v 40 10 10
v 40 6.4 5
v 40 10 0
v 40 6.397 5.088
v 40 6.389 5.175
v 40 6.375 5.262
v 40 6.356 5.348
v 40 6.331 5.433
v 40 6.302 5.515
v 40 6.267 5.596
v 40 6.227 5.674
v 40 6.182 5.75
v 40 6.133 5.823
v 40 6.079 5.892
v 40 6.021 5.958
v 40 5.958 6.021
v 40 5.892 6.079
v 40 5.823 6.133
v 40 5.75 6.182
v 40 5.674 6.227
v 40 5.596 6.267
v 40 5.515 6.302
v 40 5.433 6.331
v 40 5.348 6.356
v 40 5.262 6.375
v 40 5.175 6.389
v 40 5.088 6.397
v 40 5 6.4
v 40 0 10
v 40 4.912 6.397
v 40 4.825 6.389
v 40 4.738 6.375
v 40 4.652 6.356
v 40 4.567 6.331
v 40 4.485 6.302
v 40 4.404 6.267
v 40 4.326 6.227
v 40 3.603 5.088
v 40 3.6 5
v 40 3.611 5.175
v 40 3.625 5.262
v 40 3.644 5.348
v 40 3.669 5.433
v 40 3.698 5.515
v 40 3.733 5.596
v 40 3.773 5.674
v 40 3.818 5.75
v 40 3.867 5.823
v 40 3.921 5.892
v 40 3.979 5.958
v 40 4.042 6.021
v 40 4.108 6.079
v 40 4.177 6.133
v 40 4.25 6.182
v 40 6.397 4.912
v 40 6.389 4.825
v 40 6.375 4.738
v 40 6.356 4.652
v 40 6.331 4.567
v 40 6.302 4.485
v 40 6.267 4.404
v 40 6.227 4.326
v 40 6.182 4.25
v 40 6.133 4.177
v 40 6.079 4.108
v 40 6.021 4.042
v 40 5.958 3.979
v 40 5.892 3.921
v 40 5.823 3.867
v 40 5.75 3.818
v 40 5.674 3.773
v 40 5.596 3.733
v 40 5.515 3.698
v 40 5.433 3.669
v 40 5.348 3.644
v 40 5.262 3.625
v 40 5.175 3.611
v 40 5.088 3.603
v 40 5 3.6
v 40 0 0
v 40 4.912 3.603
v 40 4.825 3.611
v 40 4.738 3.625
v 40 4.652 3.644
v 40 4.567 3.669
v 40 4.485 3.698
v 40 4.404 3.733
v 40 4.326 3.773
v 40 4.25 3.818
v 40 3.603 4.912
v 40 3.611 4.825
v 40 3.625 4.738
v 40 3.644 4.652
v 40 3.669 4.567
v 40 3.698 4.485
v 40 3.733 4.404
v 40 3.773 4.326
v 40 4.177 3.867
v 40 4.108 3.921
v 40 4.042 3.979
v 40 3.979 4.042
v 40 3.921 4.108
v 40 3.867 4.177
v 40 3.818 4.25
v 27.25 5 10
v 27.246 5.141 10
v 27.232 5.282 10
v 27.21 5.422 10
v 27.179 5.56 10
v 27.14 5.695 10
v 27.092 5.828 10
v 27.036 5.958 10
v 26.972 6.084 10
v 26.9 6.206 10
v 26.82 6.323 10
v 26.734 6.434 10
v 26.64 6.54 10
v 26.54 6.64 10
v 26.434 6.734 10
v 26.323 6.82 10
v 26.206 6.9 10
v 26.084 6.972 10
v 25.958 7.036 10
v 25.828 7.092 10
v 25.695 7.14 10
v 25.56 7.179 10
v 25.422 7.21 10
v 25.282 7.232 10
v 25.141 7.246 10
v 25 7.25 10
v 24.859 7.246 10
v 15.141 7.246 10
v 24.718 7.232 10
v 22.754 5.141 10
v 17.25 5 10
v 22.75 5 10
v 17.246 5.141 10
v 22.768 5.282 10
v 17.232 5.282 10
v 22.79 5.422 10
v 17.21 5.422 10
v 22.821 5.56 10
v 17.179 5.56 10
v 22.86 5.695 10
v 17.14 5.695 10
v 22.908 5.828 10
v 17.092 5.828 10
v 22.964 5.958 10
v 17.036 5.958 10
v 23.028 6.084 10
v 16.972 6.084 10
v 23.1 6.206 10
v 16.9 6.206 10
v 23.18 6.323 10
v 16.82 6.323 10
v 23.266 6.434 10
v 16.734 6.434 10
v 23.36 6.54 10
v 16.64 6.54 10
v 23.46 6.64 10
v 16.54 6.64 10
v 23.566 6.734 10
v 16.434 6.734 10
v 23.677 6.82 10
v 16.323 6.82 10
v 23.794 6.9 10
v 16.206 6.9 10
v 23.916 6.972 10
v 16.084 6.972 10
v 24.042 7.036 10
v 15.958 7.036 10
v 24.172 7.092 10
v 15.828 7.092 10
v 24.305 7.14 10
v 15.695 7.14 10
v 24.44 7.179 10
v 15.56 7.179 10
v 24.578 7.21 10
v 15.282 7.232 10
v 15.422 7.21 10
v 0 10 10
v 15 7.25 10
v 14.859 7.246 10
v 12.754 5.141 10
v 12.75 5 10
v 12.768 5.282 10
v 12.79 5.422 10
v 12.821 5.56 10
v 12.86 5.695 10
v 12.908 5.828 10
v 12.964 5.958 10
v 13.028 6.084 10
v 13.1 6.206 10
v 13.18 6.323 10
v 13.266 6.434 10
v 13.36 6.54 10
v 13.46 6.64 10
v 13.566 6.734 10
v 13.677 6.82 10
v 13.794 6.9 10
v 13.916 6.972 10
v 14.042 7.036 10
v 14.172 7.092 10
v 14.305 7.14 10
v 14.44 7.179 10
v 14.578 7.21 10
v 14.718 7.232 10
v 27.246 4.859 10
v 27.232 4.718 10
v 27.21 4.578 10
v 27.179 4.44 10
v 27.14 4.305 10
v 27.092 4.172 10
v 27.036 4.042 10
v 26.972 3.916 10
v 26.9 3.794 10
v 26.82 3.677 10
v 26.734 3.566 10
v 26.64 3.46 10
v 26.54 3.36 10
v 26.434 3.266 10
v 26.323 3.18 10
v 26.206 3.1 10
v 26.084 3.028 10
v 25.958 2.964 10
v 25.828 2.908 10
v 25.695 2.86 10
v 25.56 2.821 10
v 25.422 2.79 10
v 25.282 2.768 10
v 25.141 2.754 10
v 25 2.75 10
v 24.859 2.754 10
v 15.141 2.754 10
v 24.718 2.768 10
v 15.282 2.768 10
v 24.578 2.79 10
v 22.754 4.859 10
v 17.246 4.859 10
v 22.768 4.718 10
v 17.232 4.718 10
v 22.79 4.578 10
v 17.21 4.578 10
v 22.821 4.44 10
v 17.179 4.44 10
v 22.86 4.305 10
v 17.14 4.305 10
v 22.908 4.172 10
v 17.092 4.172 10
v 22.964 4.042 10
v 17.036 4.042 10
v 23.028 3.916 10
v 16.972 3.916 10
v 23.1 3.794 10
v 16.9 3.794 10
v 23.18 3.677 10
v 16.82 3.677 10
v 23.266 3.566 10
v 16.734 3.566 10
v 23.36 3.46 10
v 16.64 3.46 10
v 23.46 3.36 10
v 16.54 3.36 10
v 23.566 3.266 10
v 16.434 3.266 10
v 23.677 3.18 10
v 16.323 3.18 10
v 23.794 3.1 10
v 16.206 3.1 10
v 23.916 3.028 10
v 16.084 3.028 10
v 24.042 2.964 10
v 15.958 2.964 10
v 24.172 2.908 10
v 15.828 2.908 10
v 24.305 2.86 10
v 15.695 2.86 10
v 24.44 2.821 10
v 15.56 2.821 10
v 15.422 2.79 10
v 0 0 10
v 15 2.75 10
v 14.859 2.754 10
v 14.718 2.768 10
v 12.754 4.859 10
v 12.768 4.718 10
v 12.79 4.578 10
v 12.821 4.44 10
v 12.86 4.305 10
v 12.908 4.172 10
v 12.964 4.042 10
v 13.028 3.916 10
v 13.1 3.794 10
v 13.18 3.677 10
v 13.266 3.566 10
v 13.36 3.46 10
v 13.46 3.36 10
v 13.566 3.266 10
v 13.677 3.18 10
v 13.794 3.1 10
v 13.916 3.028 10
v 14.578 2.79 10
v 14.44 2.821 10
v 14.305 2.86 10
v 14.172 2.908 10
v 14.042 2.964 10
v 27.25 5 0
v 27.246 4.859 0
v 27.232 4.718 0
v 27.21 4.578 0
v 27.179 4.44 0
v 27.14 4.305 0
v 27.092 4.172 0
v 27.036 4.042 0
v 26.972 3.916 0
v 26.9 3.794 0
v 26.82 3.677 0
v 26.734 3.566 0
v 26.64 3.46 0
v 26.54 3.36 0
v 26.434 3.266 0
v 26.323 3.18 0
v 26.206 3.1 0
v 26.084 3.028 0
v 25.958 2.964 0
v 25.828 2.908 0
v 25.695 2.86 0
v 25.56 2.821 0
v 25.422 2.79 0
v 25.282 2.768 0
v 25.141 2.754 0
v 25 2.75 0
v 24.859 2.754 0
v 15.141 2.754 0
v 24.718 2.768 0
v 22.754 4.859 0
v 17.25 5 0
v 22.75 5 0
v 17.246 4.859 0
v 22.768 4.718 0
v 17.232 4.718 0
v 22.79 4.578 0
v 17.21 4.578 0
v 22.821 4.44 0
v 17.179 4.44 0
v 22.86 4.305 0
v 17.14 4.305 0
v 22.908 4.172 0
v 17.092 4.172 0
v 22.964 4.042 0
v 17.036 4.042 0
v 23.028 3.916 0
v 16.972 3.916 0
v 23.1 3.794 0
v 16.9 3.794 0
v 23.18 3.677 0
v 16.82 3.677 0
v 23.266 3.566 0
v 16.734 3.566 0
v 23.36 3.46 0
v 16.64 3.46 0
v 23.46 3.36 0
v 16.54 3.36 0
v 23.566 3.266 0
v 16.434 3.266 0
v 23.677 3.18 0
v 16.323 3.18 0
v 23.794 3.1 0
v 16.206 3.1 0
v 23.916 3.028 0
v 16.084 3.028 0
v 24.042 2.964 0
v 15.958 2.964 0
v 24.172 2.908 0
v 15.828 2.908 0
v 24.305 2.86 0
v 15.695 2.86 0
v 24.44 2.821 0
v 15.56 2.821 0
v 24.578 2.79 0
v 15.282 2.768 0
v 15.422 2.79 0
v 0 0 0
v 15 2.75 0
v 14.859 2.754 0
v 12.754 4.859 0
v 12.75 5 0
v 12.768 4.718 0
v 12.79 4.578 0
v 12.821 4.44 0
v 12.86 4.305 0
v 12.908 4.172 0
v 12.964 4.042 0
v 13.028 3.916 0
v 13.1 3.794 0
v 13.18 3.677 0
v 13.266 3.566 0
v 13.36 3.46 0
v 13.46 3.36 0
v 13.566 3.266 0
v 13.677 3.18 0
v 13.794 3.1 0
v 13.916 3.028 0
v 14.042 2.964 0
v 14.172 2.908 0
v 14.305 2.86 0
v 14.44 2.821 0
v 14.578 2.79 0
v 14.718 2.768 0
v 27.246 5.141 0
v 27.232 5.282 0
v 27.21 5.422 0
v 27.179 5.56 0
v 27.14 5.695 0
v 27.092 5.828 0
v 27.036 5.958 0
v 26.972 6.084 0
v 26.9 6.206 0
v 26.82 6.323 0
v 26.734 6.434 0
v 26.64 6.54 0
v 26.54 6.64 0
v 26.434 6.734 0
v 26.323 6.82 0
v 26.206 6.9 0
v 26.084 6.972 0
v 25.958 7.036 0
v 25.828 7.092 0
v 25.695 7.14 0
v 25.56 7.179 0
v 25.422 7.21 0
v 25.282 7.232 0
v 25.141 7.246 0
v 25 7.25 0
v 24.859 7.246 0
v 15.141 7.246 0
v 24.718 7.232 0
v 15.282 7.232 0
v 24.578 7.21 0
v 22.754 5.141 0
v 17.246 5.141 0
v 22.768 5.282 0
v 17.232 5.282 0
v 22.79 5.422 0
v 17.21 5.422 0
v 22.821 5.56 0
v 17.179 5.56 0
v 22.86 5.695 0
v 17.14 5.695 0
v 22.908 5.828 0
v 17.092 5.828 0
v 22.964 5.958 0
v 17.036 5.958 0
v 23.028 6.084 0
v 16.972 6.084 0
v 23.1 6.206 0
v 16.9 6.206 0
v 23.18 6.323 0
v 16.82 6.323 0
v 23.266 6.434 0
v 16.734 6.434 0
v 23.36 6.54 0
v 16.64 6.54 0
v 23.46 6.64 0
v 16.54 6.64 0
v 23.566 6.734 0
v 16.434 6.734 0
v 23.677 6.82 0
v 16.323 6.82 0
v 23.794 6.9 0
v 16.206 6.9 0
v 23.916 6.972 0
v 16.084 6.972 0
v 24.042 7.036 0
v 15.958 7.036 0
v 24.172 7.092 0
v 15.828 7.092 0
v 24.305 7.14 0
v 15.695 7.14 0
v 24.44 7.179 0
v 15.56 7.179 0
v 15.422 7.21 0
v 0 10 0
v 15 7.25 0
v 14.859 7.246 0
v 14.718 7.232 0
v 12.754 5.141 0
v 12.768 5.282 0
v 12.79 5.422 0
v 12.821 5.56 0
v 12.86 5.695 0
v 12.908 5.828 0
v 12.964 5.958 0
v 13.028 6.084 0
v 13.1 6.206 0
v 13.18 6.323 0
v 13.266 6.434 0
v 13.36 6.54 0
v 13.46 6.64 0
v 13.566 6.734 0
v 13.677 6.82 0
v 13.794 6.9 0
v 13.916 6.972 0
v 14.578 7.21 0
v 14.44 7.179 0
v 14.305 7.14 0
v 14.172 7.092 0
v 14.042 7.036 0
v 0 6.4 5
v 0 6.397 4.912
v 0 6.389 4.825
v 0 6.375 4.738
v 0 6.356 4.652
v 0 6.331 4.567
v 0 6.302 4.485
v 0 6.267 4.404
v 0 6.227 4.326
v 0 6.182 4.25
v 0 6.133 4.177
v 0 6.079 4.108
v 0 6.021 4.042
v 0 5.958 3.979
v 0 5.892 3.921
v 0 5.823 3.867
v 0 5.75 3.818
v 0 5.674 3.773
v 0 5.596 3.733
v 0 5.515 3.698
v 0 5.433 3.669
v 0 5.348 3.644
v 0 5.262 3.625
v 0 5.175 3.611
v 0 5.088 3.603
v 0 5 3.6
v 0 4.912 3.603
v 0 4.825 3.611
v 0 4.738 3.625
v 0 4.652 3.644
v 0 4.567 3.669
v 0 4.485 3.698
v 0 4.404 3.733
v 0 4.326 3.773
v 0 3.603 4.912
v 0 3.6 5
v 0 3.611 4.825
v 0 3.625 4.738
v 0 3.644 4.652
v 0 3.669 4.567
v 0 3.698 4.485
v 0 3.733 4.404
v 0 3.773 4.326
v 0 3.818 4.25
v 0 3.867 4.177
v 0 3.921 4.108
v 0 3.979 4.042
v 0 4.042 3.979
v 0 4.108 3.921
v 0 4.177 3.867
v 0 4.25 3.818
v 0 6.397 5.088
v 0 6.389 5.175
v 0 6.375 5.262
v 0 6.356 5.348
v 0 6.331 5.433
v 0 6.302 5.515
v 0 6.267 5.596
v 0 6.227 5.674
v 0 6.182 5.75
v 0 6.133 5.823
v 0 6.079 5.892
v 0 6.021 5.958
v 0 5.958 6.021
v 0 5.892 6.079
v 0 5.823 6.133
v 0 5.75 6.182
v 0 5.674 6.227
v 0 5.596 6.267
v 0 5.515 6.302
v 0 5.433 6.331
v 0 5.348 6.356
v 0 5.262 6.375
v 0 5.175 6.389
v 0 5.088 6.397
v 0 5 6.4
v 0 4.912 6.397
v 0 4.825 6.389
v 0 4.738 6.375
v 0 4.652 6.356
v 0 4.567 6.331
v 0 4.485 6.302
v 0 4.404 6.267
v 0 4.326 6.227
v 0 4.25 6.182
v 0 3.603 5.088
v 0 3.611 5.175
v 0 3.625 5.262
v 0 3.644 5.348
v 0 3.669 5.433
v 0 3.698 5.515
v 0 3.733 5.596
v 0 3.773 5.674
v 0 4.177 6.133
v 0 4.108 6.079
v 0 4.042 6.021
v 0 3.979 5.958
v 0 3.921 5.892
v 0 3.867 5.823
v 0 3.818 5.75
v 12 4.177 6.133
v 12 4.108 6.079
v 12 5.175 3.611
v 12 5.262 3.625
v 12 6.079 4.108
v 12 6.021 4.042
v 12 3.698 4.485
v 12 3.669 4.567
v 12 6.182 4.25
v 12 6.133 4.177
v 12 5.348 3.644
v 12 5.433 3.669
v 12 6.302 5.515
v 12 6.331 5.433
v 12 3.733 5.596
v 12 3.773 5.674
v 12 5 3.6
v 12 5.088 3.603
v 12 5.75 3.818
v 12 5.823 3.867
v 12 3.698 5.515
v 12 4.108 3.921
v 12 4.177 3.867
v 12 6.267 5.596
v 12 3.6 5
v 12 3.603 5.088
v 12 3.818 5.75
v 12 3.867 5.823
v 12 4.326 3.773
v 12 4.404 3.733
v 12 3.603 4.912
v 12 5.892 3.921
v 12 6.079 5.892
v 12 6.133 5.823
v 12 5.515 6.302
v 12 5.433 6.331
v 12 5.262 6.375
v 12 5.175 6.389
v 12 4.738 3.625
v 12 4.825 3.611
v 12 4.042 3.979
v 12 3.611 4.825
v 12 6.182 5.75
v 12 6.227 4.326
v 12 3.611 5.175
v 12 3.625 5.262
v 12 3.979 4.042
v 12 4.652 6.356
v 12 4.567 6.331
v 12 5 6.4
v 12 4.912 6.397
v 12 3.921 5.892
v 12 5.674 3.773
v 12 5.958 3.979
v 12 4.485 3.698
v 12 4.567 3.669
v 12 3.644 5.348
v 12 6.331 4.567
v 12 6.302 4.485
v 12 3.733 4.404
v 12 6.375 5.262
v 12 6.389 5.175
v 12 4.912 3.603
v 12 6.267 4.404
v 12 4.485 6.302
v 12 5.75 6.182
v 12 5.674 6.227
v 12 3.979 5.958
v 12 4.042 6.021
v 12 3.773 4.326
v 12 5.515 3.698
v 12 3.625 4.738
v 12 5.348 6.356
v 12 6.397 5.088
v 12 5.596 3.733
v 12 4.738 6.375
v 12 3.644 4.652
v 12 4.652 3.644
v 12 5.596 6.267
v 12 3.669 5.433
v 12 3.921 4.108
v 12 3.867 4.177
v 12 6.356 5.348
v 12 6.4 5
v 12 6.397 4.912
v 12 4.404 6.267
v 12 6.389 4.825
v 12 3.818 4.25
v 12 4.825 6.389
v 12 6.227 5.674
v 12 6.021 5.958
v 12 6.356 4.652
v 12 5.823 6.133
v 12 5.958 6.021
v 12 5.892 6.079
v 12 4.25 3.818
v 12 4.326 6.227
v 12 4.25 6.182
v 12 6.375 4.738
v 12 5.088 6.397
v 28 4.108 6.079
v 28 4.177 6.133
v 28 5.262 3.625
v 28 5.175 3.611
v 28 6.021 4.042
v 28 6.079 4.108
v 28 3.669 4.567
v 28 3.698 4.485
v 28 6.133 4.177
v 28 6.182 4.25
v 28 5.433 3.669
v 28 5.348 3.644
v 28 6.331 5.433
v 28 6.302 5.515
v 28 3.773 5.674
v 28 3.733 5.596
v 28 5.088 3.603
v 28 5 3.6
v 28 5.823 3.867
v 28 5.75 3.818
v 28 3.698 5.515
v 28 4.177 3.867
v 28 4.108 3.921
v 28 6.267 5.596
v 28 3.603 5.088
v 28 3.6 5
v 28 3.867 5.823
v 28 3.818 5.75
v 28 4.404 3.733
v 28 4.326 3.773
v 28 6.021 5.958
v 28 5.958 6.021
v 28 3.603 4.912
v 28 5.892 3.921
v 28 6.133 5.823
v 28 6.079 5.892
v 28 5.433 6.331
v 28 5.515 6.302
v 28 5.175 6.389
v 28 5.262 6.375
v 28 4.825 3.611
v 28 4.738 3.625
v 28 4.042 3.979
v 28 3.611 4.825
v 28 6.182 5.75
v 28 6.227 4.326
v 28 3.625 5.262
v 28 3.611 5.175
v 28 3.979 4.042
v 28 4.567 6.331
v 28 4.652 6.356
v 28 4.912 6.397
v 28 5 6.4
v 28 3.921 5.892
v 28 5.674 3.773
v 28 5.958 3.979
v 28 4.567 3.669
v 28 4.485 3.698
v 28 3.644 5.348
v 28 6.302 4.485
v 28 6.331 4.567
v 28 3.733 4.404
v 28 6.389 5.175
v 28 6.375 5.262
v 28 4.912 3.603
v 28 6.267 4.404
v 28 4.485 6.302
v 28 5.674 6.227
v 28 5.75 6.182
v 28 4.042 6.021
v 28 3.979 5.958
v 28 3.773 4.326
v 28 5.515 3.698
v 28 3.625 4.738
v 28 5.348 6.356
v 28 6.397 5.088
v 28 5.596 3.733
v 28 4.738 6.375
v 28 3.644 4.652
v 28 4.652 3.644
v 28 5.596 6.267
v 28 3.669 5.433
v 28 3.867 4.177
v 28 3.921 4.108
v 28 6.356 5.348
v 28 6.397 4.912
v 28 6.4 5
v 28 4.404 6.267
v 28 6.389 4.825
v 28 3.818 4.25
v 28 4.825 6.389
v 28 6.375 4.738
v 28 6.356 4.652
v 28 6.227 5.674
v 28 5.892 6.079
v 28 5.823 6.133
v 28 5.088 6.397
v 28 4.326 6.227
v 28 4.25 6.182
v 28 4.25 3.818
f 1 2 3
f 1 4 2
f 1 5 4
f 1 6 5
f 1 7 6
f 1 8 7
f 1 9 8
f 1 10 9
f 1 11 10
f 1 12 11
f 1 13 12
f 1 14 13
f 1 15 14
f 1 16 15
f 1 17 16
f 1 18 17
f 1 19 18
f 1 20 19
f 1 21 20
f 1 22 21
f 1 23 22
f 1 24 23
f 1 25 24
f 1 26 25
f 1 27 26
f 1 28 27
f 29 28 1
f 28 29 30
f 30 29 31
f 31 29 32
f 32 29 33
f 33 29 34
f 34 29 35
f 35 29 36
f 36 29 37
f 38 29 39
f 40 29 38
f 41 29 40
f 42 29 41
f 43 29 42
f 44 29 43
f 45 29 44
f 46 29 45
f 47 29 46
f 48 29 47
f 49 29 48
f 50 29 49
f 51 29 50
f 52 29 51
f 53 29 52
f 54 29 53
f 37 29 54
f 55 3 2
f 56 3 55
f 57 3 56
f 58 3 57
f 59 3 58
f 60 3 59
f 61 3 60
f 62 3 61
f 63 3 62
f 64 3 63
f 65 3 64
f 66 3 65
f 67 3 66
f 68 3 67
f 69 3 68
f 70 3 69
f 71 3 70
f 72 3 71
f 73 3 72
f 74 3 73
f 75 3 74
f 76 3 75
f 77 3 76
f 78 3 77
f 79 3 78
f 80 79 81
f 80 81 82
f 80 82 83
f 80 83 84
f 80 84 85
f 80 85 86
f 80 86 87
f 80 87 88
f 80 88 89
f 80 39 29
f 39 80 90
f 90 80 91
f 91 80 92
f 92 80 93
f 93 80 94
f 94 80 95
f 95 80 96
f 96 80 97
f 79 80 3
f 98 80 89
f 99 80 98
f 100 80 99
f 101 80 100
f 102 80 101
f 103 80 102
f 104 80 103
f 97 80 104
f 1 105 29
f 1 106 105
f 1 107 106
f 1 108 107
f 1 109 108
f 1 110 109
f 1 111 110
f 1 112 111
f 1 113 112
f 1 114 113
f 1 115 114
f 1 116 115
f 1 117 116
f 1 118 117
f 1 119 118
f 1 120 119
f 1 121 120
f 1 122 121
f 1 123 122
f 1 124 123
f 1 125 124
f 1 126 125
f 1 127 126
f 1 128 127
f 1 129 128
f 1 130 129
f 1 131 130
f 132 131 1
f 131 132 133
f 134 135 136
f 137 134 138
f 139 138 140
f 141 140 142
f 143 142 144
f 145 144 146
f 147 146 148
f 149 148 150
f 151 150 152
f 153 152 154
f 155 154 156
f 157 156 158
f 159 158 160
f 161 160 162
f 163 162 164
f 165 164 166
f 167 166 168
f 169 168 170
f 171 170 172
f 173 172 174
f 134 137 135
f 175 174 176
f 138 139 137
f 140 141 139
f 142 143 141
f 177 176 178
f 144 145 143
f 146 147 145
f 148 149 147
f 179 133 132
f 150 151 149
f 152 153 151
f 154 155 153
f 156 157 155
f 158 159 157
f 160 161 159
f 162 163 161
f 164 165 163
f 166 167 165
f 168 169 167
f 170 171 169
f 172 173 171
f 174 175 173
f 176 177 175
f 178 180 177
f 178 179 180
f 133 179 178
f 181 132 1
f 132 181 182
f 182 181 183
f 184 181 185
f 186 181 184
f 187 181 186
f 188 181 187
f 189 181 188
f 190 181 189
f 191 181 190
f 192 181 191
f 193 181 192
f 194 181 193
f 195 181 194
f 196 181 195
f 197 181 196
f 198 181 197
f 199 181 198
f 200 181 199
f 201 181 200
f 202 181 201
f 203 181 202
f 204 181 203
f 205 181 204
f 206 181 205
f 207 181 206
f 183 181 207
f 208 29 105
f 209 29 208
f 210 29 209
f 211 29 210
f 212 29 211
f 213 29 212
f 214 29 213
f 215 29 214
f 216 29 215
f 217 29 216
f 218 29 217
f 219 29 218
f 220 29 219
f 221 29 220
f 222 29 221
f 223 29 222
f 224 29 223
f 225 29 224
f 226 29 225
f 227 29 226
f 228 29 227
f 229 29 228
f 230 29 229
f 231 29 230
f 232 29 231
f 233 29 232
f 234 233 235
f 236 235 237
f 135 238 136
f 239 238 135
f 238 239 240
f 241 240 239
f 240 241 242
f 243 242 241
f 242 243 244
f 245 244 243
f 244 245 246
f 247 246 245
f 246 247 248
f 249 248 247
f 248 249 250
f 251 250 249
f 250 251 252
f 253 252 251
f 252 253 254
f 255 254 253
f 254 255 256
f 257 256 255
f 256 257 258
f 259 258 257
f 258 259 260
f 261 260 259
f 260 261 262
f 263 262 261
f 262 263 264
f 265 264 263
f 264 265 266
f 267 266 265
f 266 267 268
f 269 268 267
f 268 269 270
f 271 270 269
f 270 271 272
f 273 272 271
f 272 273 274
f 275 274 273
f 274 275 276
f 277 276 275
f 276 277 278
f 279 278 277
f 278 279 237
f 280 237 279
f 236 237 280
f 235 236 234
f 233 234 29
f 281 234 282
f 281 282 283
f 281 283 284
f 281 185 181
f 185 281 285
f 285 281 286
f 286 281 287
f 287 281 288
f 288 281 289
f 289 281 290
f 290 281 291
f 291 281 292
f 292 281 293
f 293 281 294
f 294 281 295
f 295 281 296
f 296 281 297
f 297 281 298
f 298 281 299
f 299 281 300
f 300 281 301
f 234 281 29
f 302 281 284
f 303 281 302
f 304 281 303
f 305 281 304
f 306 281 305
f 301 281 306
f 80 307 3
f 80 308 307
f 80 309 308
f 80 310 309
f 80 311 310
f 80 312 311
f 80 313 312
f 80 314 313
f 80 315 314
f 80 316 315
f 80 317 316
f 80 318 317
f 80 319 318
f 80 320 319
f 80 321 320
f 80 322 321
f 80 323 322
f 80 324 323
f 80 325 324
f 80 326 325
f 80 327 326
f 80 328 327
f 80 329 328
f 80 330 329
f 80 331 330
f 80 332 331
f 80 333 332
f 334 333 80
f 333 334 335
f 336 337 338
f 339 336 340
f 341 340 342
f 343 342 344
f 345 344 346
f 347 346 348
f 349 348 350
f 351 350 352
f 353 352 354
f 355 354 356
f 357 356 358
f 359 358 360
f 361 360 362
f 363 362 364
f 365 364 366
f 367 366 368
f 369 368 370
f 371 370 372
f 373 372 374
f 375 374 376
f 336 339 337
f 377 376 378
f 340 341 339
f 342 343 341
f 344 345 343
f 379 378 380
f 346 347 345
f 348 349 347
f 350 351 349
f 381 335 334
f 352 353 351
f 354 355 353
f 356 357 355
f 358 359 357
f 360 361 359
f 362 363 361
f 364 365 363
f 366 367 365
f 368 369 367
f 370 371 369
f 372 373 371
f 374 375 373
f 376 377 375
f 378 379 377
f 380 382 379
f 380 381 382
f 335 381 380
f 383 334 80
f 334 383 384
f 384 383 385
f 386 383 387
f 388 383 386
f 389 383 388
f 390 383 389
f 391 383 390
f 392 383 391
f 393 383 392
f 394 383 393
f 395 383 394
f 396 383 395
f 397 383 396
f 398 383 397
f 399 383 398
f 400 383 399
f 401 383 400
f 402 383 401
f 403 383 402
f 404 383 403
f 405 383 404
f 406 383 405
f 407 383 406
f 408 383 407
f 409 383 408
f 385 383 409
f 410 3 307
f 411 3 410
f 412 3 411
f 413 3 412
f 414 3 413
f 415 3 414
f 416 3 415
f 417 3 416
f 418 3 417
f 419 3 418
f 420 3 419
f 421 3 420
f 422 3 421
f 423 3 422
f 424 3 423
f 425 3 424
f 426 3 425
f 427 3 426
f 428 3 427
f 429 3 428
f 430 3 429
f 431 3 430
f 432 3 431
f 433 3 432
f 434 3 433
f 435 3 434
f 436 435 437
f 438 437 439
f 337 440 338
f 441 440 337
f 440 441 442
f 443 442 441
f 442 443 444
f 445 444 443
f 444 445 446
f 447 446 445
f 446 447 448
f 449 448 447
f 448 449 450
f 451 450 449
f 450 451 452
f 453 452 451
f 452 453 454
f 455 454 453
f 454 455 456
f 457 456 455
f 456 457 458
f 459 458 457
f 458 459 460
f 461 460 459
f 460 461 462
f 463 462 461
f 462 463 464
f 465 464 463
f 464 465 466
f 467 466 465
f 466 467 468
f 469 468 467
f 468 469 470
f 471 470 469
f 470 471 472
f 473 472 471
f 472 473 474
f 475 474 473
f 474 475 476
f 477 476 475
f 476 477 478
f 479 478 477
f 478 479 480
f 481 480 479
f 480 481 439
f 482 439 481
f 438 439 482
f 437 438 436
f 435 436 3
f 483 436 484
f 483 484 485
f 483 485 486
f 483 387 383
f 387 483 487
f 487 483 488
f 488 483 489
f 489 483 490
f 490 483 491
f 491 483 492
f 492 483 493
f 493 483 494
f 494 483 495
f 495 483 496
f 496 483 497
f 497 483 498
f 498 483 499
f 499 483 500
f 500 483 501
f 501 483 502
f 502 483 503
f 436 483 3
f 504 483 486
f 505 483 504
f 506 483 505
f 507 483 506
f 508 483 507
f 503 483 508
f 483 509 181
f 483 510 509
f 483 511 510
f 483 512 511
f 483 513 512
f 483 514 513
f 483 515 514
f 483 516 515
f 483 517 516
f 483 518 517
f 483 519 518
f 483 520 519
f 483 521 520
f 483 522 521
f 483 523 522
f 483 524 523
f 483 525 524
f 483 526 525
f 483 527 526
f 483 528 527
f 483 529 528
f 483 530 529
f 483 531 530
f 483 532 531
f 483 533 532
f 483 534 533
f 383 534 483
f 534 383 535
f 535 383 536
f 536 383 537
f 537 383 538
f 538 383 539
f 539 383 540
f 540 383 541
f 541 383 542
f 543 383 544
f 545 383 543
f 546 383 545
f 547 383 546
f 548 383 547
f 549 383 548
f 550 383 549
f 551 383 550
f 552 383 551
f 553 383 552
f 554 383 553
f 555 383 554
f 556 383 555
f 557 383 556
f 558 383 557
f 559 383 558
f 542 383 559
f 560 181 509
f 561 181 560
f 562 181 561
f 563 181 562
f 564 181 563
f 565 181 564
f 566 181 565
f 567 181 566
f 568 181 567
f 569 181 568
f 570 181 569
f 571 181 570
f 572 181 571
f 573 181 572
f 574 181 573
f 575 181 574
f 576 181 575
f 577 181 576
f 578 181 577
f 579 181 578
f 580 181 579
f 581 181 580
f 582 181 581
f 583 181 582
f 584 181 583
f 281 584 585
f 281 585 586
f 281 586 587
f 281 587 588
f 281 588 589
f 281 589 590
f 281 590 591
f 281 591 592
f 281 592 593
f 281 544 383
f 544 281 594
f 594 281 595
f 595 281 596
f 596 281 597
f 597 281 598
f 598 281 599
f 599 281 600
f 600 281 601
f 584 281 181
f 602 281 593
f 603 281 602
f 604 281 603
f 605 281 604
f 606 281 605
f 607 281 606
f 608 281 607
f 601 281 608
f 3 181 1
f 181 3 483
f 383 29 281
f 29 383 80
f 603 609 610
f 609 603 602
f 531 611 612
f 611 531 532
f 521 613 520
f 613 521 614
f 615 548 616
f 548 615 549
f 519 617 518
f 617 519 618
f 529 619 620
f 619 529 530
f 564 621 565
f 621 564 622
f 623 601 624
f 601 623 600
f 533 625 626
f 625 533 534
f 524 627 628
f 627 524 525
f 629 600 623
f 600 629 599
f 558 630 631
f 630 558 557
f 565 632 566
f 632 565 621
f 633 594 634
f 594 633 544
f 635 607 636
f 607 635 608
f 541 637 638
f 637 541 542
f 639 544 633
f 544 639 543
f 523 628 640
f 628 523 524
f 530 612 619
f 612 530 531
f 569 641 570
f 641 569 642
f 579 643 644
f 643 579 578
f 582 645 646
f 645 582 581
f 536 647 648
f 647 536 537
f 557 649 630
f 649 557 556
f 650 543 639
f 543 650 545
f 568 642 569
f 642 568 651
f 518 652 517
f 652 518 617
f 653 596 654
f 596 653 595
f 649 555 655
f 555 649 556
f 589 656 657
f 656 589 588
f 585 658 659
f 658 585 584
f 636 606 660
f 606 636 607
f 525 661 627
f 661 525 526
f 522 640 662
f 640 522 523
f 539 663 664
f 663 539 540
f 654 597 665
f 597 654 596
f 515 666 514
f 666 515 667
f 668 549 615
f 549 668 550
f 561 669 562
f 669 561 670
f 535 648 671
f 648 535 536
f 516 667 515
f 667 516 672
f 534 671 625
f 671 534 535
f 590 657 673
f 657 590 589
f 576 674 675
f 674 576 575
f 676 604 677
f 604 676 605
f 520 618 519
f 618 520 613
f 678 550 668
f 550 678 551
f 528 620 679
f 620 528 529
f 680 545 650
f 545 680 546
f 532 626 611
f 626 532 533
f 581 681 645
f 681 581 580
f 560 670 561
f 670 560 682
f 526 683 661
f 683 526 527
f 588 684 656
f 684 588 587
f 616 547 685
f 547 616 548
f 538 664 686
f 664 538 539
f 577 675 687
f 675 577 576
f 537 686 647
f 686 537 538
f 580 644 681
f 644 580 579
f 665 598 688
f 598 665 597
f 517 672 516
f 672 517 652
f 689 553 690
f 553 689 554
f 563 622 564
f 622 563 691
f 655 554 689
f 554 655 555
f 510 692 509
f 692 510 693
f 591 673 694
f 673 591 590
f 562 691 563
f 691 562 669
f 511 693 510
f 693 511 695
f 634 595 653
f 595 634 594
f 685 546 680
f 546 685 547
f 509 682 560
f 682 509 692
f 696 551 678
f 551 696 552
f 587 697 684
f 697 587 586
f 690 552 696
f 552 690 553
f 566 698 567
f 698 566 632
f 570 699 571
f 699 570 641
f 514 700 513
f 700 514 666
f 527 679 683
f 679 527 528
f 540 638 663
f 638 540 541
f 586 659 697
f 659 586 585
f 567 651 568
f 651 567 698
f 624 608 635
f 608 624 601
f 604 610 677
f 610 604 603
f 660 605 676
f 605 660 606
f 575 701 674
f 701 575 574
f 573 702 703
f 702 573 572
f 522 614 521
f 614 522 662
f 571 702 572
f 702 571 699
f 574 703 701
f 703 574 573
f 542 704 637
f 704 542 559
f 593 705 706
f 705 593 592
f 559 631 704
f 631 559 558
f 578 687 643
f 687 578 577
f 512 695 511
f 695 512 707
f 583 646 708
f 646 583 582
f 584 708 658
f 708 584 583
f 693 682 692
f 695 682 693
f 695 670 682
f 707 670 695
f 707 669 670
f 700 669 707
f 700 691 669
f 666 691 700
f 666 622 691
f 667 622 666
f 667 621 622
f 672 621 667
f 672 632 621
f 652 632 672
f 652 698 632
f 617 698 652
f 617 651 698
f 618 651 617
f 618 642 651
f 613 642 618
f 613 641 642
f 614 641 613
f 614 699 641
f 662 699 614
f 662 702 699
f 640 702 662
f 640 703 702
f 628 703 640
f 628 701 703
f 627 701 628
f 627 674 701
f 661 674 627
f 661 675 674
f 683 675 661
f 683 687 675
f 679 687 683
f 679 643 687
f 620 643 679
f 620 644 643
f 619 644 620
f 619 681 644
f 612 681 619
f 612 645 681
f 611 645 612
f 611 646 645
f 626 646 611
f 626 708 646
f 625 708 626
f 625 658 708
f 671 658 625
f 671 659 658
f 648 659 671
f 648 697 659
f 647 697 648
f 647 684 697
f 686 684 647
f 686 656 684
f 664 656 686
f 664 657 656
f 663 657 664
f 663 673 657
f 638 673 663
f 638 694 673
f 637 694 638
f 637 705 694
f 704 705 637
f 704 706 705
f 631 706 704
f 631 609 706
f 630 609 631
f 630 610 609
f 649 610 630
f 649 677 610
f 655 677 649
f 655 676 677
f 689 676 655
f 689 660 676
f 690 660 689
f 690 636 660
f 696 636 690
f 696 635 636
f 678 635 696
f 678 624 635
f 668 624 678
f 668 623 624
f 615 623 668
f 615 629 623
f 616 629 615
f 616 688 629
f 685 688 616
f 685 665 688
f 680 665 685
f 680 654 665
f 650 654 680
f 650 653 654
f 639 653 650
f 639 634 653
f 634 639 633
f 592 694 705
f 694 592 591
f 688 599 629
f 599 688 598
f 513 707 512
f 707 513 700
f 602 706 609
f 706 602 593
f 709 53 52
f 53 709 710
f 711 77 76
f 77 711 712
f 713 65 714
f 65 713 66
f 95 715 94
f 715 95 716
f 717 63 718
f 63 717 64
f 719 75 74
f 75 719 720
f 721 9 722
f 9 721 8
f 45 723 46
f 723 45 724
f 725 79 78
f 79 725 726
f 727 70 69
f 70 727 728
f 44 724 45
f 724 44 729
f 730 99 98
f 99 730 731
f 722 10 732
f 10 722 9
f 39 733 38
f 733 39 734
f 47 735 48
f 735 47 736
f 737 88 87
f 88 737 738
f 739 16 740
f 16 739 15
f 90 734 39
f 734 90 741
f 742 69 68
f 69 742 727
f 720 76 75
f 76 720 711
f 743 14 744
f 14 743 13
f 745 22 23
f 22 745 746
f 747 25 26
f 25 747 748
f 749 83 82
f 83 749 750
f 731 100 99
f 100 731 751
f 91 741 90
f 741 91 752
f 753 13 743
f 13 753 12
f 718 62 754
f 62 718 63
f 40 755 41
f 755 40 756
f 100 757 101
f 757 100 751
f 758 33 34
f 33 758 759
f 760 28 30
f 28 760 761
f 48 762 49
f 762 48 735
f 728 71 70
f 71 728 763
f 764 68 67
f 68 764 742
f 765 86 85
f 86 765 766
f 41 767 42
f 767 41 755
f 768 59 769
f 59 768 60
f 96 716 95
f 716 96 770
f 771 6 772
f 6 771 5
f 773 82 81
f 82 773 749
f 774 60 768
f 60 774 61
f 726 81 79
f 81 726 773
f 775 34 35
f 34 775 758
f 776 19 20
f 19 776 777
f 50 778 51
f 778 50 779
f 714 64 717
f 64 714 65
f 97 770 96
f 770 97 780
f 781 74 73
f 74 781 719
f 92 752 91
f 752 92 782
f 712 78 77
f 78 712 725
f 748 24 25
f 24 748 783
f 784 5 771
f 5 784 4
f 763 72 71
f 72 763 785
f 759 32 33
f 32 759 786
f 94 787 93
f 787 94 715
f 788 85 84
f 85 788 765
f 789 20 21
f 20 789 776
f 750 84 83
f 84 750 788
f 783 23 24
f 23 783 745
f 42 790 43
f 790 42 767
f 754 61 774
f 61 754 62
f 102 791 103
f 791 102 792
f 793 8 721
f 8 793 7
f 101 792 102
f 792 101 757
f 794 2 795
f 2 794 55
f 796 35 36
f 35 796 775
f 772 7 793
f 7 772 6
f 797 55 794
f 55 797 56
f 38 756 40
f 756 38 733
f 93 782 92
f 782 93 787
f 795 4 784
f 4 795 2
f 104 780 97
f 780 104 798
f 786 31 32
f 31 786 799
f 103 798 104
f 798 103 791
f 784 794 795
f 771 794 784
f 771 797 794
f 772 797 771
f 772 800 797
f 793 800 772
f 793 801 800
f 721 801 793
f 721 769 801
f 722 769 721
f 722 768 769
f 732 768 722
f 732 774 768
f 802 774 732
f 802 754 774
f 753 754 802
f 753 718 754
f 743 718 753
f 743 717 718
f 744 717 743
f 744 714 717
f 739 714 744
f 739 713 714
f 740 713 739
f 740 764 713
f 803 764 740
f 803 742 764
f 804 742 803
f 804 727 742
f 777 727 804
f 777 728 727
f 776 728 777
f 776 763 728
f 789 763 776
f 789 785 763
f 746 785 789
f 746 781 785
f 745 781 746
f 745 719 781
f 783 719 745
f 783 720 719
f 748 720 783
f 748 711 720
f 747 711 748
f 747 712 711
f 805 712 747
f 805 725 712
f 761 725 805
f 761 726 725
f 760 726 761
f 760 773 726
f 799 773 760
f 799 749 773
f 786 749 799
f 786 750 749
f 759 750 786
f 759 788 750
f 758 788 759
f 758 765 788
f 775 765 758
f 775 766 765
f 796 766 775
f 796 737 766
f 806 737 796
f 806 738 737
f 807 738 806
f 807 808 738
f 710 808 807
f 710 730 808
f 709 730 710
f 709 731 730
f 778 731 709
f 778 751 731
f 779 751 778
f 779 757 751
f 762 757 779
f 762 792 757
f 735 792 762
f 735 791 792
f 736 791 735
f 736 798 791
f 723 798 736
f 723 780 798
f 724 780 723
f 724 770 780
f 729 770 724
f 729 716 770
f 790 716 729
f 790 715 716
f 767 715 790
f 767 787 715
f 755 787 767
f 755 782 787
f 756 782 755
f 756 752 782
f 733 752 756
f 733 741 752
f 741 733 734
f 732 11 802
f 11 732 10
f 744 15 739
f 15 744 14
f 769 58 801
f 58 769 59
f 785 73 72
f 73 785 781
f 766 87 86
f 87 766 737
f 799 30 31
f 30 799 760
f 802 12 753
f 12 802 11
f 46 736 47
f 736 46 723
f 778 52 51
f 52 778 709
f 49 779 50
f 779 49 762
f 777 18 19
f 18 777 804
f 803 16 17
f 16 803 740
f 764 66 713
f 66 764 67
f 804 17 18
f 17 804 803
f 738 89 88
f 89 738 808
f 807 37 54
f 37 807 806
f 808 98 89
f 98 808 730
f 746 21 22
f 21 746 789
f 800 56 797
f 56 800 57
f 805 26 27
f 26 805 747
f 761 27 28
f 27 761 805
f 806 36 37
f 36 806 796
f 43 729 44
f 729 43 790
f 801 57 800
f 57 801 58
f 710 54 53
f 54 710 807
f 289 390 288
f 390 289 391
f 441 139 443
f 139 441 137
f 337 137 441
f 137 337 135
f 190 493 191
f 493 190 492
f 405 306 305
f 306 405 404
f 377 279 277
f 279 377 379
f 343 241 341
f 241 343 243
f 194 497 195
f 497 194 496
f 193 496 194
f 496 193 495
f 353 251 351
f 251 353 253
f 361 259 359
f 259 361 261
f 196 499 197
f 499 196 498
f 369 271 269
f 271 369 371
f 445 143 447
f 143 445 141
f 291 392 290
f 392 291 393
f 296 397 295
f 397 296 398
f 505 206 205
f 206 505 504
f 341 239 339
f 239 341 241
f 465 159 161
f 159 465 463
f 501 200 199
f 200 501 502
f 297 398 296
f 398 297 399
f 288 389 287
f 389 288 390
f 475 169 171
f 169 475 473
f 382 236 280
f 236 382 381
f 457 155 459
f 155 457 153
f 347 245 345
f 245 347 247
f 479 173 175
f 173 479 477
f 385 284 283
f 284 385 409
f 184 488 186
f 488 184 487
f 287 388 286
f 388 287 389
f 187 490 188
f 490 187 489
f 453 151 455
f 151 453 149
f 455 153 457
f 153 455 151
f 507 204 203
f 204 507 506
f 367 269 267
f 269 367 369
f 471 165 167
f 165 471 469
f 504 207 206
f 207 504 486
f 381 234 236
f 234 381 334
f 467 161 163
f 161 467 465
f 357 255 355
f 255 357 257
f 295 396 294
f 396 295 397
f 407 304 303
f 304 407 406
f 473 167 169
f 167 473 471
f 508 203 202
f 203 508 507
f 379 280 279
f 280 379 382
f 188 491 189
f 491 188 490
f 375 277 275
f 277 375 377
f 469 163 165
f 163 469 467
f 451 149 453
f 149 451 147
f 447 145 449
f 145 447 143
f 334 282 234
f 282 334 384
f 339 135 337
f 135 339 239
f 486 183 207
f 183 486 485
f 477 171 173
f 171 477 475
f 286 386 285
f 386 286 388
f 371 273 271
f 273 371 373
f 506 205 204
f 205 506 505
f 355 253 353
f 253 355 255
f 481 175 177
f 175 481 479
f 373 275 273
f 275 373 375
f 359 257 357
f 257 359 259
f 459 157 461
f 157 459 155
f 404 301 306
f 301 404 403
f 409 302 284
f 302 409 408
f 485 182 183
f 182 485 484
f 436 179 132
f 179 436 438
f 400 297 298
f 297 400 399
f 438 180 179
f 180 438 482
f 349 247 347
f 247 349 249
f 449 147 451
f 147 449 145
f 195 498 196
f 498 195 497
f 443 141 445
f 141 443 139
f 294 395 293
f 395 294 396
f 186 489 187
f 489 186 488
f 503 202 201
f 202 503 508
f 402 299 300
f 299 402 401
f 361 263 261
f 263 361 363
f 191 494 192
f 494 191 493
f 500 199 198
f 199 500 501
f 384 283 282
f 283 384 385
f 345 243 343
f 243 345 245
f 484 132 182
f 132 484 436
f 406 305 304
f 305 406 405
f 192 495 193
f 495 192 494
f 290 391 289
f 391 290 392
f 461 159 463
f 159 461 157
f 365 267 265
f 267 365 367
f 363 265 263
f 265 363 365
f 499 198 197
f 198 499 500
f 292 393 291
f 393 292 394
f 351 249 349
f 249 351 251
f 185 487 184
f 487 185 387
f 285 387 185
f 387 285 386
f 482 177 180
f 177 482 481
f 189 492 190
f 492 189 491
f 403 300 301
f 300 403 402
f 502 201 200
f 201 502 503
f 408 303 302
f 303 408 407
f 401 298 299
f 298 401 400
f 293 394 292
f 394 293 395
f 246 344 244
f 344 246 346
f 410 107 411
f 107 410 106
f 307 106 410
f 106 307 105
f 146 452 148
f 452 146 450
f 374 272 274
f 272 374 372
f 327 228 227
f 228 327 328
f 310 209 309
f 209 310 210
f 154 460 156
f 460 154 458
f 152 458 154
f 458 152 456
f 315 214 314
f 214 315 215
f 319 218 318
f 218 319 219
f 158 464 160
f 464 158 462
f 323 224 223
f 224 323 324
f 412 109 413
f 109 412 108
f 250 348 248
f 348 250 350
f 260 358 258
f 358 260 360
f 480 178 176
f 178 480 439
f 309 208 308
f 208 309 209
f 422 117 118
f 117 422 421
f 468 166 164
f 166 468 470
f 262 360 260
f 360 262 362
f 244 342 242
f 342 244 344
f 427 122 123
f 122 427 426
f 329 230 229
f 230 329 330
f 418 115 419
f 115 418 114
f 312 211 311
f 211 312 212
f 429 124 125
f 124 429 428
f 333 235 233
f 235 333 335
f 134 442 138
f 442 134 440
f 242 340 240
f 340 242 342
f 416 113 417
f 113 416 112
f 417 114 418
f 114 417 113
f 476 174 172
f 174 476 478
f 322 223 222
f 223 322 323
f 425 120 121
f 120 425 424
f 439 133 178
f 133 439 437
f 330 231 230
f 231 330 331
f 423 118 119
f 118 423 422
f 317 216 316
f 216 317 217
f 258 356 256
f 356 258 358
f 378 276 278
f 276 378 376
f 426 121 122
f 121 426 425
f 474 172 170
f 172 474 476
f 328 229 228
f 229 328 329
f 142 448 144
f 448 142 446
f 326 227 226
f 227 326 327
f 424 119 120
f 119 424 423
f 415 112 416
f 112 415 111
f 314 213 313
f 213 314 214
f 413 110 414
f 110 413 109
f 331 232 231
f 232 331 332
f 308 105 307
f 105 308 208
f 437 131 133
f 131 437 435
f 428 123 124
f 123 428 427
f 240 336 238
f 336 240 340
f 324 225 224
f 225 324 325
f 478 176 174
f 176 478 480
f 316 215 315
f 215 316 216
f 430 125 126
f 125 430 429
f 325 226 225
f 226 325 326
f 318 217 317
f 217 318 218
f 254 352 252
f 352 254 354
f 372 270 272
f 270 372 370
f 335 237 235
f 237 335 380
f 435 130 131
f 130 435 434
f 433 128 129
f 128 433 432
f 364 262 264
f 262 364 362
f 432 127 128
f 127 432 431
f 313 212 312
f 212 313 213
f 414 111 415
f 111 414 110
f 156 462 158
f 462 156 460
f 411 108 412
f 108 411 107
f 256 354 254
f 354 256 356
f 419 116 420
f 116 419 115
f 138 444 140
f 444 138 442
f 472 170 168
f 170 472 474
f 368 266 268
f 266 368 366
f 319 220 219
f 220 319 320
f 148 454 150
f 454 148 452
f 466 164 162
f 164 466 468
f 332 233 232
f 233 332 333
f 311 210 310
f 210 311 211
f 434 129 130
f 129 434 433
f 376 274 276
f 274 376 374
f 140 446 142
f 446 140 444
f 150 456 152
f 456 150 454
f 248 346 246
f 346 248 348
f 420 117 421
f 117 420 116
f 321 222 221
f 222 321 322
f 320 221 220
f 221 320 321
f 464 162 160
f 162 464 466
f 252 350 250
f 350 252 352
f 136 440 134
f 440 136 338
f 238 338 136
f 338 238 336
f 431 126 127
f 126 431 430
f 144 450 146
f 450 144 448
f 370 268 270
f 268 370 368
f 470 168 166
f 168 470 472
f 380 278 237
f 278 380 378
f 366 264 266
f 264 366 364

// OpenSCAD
//W=62.3;
W=40;
H=10;
$fn=100;

difference()
{
    cube([W,H,H]);
    translate([-1,5,5]) rotate([0,90,0]) cylinder(h=13,d=2.8);
    translate([W-12,5,5]) rotate([0,90,0]) cylinder(h=13,d=2.8);
    translate([15,5,-1]) cylinder(h=15,d=4.5);
    translate([W-15,5,-1]) cylinder(h=15,d=4.5);
}
